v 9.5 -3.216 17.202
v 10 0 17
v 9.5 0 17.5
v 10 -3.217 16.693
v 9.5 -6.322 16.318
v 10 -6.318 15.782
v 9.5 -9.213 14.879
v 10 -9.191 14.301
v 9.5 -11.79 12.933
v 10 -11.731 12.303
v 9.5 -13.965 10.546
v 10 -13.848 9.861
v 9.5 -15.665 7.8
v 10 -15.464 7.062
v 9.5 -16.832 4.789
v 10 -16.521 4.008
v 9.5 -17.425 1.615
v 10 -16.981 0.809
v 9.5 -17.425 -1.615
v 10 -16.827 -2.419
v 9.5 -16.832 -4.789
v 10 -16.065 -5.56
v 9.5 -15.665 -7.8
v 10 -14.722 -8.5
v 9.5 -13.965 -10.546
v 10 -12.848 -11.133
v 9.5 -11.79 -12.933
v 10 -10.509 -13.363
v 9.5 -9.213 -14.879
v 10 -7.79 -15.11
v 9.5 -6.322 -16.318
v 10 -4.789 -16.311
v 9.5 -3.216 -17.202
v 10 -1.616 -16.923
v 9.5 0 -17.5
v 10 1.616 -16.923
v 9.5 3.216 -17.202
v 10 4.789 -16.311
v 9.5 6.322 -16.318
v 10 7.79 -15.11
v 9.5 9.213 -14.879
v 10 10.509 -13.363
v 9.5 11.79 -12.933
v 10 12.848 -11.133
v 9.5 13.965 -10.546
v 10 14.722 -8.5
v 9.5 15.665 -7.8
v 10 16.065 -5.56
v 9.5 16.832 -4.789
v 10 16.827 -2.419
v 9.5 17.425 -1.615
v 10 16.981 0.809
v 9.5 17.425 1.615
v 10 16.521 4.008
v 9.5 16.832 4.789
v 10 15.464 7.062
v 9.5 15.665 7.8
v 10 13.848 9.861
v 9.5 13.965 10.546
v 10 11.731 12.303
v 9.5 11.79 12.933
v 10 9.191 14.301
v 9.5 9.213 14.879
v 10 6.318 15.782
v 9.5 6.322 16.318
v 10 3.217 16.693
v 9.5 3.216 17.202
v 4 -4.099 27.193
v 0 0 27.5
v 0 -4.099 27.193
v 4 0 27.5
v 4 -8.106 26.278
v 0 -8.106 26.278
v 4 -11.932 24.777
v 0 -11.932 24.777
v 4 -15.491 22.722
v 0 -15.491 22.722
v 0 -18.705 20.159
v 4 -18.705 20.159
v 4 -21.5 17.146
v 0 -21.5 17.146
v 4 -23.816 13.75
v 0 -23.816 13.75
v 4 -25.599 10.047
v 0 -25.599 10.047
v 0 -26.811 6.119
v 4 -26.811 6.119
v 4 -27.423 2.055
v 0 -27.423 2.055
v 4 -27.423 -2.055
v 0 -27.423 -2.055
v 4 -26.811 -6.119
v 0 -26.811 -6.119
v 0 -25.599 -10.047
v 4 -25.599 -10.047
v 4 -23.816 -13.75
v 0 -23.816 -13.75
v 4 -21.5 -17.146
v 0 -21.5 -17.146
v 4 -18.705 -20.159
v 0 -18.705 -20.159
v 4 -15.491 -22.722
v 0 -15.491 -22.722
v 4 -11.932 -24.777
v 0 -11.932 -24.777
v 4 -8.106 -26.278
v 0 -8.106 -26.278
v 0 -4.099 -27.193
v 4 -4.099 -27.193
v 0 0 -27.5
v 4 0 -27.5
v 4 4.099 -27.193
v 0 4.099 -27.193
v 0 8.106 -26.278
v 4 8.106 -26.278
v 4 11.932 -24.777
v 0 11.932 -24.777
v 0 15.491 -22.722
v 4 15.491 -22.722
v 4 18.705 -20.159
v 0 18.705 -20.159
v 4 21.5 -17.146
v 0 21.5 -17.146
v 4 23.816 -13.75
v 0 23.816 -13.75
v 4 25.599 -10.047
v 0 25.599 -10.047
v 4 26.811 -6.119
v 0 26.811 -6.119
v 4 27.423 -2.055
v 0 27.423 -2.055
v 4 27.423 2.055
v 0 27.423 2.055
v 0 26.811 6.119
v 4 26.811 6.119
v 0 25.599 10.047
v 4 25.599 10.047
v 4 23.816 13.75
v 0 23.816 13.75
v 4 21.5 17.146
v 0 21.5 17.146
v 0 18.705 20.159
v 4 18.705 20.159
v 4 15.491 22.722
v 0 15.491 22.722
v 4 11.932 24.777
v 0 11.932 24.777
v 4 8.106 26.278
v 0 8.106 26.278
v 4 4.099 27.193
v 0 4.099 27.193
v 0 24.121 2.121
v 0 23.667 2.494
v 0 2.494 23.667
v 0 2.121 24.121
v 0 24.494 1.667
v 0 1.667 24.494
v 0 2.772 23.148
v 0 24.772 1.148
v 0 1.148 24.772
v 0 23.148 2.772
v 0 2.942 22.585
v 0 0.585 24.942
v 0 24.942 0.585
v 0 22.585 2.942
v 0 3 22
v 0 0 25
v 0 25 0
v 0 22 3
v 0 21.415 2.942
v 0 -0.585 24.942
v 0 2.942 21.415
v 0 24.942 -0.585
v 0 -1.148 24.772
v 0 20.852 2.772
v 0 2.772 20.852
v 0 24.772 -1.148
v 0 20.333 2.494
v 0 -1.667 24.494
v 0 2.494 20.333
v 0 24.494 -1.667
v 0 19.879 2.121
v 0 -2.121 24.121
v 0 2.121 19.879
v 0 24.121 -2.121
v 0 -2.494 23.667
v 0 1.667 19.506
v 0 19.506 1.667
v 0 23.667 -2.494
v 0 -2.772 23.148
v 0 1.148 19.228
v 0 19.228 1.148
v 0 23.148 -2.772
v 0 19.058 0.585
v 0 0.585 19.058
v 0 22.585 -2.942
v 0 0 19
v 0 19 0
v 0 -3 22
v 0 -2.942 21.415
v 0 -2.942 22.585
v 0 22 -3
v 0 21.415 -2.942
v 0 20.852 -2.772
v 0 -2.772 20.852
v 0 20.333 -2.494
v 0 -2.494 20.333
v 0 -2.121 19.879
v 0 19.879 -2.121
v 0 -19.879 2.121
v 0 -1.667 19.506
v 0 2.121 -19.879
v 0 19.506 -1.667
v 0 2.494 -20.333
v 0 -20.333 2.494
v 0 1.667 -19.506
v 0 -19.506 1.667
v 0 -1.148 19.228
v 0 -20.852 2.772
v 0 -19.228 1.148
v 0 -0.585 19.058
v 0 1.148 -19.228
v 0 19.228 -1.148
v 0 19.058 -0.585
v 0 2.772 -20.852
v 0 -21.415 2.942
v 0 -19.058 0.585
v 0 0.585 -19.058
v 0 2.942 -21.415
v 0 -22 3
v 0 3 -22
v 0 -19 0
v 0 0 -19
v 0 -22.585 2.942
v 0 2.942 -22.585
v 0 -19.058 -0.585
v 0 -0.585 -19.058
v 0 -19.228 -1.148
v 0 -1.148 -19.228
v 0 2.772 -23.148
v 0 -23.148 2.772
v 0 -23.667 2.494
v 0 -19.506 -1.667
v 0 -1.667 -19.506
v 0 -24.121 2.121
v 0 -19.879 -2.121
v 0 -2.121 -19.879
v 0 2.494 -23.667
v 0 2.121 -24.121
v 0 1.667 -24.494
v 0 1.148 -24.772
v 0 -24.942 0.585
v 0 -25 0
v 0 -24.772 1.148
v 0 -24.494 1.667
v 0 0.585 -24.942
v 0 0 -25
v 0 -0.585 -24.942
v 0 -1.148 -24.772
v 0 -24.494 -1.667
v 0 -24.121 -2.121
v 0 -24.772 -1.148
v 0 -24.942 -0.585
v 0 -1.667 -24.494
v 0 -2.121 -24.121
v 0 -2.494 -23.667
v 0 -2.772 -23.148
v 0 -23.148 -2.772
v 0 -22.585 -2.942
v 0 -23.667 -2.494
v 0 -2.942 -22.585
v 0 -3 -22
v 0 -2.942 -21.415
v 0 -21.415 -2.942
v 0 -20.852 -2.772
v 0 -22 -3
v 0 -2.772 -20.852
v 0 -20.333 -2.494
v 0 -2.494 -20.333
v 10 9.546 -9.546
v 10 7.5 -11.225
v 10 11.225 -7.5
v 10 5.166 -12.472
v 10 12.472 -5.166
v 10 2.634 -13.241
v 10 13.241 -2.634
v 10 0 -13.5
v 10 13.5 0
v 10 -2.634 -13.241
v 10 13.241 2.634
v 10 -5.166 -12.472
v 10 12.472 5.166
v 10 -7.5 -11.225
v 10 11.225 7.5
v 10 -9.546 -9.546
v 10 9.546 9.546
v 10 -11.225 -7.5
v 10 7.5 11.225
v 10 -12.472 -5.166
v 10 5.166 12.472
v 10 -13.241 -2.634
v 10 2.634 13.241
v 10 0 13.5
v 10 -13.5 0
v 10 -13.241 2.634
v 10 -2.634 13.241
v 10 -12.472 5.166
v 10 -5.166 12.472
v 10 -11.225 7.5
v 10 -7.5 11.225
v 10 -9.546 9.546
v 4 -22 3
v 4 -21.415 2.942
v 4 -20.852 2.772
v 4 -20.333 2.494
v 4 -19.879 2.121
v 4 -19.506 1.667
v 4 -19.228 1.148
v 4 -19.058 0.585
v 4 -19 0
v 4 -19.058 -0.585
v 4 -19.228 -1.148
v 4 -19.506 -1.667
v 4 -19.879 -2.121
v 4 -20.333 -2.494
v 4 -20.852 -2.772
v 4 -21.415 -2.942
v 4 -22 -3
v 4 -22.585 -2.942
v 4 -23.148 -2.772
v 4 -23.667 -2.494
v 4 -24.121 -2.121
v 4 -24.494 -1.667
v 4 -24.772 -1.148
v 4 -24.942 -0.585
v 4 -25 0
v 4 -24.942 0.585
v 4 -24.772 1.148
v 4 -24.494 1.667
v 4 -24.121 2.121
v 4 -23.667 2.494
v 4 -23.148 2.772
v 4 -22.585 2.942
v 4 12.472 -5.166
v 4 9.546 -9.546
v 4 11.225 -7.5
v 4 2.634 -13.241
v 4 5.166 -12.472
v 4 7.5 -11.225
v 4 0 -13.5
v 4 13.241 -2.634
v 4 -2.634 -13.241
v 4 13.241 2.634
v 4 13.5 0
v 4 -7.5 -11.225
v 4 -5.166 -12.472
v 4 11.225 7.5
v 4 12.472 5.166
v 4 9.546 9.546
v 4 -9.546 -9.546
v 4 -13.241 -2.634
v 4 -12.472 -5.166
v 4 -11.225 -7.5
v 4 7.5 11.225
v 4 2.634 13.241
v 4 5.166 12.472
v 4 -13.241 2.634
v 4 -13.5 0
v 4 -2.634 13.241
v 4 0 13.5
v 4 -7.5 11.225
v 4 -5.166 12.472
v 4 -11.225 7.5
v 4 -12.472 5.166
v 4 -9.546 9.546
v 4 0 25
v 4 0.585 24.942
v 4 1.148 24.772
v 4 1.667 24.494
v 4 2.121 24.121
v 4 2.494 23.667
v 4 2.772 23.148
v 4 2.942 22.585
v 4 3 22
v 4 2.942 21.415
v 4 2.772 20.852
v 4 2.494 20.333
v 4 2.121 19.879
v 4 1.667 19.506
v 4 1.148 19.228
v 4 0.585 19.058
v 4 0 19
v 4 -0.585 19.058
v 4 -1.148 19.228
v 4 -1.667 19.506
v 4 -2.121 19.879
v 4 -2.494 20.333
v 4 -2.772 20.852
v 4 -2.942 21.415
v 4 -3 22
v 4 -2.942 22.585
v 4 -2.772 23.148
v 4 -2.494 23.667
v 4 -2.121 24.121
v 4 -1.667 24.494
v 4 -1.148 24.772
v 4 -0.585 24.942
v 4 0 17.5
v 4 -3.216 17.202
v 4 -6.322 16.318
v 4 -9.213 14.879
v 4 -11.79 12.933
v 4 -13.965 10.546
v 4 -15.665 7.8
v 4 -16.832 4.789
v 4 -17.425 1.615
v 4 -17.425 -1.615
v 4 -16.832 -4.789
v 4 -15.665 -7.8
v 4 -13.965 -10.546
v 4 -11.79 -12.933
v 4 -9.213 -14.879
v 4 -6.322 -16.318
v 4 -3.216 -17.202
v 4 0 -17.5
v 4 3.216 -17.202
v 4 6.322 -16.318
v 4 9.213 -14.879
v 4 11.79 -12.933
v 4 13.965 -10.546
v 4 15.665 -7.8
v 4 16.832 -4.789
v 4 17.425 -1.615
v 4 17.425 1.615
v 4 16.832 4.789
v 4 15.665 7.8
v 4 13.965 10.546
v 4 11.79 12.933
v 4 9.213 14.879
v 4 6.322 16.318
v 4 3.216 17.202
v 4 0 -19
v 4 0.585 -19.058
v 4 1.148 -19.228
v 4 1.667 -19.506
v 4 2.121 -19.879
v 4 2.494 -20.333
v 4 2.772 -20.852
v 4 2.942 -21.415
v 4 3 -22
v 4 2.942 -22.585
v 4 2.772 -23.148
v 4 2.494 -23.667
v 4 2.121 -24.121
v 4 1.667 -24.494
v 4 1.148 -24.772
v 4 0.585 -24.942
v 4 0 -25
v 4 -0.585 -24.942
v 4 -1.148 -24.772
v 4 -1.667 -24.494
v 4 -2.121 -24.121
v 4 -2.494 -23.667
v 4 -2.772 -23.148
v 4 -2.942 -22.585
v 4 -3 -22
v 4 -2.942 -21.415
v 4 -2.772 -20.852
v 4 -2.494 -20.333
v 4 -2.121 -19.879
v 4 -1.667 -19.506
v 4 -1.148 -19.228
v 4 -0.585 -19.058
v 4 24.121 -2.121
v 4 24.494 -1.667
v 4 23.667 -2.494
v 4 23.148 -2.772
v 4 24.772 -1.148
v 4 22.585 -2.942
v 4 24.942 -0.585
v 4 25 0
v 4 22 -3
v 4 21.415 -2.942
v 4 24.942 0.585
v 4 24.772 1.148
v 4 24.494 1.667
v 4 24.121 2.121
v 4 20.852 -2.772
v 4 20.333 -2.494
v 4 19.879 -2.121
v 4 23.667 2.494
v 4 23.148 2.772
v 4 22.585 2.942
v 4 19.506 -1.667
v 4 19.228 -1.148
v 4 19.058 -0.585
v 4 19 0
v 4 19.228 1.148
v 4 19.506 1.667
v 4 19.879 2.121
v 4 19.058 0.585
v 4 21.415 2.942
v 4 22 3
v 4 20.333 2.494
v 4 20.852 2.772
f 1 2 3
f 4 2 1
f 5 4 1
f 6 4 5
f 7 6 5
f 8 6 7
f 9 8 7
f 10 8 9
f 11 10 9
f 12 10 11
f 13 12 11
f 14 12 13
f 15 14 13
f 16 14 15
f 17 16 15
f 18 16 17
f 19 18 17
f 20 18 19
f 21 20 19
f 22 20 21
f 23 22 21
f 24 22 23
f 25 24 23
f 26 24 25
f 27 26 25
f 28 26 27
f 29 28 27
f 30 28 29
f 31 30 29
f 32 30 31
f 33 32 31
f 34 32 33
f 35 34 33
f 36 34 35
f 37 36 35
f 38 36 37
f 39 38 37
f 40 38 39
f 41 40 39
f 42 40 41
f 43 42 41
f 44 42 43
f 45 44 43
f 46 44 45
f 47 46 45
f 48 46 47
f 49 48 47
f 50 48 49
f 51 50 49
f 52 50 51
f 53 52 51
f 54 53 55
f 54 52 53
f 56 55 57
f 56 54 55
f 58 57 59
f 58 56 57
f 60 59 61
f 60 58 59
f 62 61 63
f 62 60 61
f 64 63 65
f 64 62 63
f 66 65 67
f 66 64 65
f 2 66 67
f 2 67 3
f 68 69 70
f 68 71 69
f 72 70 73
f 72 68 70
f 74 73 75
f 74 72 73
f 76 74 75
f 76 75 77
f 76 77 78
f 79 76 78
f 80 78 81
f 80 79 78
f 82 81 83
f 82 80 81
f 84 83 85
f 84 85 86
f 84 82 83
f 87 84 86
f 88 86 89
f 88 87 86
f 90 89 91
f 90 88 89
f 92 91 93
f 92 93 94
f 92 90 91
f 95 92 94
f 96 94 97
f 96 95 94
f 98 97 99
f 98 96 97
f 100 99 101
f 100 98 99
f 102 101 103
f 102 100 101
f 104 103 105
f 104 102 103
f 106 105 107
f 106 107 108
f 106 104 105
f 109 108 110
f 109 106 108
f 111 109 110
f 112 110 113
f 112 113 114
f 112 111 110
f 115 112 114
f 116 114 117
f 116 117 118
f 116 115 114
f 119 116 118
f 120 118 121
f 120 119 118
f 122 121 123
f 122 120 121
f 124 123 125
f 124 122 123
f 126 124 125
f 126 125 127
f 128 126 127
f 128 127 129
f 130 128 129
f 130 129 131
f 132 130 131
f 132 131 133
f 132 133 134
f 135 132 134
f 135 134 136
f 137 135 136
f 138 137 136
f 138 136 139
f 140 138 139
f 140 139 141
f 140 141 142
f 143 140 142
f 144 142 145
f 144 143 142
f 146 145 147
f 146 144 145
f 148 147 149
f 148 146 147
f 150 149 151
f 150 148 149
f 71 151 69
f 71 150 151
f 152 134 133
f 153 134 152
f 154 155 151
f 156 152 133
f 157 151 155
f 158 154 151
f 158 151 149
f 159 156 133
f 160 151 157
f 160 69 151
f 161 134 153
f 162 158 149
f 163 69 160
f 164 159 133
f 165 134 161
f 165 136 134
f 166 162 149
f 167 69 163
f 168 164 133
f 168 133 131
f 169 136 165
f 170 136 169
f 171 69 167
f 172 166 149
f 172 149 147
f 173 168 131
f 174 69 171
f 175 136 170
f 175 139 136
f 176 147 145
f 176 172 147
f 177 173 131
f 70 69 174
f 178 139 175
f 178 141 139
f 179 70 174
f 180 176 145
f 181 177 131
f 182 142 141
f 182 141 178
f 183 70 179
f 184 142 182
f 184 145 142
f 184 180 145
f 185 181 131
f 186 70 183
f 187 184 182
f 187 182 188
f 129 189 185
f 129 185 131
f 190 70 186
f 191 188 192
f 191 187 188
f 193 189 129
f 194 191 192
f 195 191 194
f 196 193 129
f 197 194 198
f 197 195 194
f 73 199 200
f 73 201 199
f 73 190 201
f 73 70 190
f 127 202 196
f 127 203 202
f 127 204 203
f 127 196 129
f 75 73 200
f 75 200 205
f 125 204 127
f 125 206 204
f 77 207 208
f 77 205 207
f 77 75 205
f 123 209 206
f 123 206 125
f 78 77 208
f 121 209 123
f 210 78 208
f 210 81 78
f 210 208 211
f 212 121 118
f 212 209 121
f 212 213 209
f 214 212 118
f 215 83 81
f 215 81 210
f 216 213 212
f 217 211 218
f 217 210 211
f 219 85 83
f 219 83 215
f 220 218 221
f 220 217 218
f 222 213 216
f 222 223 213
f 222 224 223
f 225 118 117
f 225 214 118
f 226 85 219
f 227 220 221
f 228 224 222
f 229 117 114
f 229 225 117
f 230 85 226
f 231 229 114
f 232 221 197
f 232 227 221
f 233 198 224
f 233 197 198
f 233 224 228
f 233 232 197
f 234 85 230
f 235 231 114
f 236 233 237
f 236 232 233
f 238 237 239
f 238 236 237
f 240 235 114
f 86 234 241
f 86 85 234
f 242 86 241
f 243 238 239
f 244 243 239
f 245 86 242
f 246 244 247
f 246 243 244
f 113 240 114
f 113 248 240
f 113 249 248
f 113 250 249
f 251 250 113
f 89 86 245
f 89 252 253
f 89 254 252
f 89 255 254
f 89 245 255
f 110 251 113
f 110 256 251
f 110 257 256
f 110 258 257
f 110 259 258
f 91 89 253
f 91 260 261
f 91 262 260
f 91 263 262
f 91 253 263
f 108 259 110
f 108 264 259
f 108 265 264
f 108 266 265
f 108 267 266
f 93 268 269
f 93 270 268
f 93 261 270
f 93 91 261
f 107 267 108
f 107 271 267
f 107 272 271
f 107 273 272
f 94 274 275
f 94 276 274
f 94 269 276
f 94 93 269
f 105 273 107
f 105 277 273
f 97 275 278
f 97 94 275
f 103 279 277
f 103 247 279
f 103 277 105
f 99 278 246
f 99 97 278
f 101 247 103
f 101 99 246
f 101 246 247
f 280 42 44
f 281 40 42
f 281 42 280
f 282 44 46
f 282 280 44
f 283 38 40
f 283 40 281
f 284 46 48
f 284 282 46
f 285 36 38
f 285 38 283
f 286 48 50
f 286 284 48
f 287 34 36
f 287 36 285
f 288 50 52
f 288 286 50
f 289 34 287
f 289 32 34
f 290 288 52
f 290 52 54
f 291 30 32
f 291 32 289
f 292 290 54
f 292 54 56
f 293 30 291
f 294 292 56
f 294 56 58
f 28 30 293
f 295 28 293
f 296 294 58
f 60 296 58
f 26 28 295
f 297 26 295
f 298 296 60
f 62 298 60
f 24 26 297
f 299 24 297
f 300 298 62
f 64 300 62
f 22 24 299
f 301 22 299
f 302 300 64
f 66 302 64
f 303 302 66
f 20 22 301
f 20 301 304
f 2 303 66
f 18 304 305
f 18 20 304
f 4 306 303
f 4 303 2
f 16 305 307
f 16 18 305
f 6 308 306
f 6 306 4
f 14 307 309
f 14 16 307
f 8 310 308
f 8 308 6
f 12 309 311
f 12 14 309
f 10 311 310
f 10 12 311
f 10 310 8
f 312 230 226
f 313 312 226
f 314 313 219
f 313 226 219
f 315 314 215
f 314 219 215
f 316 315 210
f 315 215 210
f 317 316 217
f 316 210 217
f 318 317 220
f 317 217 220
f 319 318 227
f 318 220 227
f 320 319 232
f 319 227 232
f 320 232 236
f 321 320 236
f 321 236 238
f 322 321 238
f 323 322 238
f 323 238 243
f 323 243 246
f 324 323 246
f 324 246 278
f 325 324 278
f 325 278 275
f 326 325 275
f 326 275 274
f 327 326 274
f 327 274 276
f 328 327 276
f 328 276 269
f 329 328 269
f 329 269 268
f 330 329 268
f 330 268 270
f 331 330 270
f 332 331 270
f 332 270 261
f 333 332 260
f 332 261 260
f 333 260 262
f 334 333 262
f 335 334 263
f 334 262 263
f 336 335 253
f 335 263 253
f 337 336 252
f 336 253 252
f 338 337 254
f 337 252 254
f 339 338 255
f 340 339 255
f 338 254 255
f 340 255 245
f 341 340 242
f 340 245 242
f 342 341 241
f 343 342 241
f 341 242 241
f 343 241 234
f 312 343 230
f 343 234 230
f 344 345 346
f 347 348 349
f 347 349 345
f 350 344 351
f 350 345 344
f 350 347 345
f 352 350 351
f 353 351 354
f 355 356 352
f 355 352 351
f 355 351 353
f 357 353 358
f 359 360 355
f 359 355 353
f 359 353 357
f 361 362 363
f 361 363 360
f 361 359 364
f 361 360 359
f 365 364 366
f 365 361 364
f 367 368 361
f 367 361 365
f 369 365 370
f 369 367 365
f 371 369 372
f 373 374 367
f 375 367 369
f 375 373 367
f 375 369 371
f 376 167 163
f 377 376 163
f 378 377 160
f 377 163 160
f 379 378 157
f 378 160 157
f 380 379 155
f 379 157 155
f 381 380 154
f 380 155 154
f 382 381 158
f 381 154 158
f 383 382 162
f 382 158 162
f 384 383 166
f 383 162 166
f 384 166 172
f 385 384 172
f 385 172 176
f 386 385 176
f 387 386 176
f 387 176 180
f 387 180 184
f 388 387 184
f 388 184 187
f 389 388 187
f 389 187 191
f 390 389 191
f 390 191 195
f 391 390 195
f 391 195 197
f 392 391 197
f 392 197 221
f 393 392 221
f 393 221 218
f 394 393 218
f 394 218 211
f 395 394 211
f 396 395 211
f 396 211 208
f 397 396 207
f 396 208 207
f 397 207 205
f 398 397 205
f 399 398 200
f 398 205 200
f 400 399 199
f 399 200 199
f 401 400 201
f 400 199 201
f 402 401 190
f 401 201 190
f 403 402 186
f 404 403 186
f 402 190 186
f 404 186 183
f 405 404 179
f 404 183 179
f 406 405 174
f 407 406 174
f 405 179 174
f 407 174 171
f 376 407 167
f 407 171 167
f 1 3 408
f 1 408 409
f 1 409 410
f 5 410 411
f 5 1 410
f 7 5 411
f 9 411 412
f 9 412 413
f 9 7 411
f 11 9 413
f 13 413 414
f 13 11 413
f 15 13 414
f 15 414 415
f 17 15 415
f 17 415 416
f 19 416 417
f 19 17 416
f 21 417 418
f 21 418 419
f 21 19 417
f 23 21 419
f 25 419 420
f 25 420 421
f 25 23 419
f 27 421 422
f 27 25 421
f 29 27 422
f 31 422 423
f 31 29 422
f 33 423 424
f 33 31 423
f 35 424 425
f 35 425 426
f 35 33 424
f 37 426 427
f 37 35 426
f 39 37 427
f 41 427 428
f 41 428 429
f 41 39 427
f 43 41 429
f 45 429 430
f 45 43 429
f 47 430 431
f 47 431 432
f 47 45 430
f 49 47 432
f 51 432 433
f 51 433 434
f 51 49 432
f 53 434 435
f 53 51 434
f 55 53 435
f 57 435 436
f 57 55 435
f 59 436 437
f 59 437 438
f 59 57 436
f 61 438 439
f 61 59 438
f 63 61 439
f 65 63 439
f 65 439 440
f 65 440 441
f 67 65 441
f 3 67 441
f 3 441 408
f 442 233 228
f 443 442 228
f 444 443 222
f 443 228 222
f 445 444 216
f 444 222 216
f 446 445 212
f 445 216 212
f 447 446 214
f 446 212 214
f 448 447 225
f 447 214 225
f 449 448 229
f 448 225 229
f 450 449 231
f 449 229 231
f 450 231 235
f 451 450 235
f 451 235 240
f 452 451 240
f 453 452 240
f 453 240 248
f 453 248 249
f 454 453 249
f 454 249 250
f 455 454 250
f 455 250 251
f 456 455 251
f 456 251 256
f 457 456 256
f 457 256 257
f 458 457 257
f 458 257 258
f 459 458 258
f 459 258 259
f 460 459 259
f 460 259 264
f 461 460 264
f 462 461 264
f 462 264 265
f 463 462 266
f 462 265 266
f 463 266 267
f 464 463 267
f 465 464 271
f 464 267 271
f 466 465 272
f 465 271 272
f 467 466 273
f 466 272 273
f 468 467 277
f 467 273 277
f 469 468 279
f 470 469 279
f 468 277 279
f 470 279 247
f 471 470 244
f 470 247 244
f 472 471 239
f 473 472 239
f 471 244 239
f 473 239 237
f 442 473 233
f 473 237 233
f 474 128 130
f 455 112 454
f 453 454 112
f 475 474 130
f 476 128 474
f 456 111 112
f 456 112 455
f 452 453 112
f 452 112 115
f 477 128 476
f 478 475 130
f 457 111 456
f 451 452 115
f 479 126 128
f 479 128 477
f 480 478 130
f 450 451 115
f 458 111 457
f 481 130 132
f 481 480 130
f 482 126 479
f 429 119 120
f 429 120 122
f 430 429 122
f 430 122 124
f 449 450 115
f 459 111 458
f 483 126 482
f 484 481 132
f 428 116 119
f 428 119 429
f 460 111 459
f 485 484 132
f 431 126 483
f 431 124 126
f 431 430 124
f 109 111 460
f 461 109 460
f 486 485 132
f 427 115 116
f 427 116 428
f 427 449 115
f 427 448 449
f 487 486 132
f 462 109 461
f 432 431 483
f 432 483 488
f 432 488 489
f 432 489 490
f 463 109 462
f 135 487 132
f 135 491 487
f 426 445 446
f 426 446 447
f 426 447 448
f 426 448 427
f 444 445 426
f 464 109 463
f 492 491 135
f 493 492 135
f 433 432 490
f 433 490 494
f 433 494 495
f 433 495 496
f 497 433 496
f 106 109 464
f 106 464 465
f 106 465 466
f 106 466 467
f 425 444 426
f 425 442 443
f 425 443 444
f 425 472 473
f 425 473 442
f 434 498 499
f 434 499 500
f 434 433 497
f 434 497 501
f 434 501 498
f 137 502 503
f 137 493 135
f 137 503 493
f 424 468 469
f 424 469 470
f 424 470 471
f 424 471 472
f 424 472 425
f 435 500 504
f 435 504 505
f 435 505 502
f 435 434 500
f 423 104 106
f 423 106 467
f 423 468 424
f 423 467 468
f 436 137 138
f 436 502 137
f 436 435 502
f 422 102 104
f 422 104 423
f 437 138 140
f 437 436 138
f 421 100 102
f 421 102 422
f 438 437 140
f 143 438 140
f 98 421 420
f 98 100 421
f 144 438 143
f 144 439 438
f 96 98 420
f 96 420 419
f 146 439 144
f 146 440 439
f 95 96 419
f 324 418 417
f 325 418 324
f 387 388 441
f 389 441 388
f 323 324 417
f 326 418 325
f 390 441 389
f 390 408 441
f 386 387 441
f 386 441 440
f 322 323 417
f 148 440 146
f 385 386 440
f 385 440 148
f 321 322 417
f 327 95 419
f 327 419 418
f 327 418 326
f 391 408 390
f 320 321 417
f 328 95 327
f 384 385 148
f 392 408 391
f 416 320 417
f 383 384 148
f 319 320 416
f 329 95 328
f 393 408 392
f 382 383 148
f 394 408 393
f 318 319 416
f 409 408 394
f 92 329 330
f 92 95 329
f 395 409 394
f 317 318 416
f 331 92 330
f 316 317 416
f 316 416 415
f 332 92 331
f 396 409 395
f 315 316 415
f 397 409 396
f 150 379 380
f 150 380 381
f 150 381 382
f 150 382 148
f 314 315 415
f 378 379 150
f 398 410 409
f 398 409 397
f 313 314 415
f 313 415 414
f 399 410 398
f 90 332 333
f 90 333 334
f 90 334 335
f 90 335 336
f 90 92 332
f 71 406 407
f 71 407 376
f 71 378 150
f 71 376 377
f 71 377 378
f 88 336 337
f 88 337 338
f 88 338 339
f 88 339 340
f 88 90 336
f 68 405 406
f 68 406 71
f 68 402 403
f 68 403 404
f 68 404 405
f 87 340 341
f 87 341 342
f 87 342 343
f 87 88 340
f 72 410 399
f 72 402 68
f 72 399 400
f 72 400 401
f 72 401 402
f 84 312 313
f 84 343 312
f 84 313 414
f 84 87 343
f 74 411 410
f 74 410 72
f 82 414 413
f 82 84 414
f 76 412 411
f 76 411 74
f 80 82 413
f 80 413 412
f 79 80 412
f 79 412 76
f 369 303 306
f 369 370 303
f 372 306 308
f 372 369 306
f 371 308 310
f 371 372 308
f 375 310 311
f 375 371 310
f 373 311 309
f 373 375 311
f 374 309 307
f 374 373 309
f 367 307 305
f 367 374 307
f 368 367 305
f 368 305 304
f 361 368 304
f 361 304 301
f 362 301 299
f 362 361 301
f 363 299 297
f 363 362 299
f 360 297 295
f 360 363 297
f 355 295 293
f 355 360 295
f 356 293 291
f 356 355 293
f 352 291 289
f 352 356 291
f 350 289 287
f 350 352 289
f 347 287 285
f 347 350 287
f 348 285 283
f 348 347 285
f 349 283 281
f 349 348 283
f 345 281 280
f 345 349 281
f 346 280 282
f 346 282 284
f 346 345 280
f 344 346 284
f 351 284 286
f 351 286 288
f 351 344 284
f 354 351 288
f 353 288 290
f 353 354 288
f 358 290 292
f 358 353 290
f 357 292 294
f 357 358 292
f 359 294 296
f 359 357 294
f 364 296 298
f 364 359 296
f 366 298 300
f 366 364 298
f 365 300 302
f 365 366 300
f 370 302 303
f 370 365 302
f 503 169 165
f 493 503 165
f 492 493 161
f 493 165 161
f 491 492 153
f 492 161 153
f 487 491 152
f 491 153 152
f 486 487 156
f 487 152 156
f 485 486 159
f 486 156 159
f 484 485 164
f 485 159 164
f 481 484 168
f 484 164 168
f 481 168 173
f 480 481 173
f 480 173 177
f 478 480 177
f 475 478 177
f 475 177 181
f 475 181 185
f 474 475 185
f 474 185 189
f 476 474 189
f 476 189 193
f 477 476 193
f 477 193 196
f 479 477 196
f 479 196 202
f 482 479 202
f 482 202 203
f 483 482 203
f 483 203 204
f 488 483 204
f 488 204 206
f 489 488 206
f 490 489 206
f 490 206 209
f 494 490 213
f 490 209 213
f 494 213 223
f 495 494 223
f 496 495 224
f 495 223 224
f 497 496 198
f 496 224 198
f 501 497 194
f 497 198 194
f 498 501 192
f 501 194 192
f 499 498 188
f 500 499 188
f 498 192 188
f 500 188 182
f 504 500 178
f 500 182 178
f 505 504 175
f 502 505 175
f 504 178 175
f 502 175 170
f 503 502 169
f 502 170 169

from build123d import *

# Parameters (mm, degrees)
CHAMFER1_SIZE      = 0.5
SKETCH3_R          = 3
CUT_EXTRUDE1_DEPTH = 41.155946011


with BuildPart() as part:
    # Sketch1 → Revolve2 (revolve)
    with BuildSketch(Plane(origin=(0, 0, 0), x_dir=(1, 0, 0), z_dir=(0, 1, 0)), mode=Mode.PRIVATE) as revolve2_sk:
        Polygon((0, 0), (0, 27.5), (4, 27.5), (4, 17.5), (10, 17.5), (10, 13.5), (4, 13.5), (4, 0), align=None)
    revolve(revolve2_sk.sketch.rotate(Axis((0, 0, 0), (1, 0, 0)), 180), axis=Axis((0, 0, 0), (1, 0, 0)))

    # Chamfer1
    chamfer1_edges = [part.edges().sort_by_distance(p)[0] for p in [
        (10, 0, -17.5),
    ]]
    chamfer(chamfer1_edges, length=CHAMFER1_SIZE)

    # Sketch3 → Cut-Extrude1 (cut, through all)
    with BuildSketch(Plane.ZY):
        with Locations((0, 22)):
            Circle(SKETCH3_R)
        with Locations((22, 0)):
            Circle(SKETCH3_R)
        with Locations((0, -22)):
            Circle(SKETCH3_R)
        with Locations((-22, 0)):
            Circle(SKETCH3_R)
    extrude(amount=-CUT_EXTRUDE1_DEPTH, mode=Mode.SUBTRACT)


solid = part.part
